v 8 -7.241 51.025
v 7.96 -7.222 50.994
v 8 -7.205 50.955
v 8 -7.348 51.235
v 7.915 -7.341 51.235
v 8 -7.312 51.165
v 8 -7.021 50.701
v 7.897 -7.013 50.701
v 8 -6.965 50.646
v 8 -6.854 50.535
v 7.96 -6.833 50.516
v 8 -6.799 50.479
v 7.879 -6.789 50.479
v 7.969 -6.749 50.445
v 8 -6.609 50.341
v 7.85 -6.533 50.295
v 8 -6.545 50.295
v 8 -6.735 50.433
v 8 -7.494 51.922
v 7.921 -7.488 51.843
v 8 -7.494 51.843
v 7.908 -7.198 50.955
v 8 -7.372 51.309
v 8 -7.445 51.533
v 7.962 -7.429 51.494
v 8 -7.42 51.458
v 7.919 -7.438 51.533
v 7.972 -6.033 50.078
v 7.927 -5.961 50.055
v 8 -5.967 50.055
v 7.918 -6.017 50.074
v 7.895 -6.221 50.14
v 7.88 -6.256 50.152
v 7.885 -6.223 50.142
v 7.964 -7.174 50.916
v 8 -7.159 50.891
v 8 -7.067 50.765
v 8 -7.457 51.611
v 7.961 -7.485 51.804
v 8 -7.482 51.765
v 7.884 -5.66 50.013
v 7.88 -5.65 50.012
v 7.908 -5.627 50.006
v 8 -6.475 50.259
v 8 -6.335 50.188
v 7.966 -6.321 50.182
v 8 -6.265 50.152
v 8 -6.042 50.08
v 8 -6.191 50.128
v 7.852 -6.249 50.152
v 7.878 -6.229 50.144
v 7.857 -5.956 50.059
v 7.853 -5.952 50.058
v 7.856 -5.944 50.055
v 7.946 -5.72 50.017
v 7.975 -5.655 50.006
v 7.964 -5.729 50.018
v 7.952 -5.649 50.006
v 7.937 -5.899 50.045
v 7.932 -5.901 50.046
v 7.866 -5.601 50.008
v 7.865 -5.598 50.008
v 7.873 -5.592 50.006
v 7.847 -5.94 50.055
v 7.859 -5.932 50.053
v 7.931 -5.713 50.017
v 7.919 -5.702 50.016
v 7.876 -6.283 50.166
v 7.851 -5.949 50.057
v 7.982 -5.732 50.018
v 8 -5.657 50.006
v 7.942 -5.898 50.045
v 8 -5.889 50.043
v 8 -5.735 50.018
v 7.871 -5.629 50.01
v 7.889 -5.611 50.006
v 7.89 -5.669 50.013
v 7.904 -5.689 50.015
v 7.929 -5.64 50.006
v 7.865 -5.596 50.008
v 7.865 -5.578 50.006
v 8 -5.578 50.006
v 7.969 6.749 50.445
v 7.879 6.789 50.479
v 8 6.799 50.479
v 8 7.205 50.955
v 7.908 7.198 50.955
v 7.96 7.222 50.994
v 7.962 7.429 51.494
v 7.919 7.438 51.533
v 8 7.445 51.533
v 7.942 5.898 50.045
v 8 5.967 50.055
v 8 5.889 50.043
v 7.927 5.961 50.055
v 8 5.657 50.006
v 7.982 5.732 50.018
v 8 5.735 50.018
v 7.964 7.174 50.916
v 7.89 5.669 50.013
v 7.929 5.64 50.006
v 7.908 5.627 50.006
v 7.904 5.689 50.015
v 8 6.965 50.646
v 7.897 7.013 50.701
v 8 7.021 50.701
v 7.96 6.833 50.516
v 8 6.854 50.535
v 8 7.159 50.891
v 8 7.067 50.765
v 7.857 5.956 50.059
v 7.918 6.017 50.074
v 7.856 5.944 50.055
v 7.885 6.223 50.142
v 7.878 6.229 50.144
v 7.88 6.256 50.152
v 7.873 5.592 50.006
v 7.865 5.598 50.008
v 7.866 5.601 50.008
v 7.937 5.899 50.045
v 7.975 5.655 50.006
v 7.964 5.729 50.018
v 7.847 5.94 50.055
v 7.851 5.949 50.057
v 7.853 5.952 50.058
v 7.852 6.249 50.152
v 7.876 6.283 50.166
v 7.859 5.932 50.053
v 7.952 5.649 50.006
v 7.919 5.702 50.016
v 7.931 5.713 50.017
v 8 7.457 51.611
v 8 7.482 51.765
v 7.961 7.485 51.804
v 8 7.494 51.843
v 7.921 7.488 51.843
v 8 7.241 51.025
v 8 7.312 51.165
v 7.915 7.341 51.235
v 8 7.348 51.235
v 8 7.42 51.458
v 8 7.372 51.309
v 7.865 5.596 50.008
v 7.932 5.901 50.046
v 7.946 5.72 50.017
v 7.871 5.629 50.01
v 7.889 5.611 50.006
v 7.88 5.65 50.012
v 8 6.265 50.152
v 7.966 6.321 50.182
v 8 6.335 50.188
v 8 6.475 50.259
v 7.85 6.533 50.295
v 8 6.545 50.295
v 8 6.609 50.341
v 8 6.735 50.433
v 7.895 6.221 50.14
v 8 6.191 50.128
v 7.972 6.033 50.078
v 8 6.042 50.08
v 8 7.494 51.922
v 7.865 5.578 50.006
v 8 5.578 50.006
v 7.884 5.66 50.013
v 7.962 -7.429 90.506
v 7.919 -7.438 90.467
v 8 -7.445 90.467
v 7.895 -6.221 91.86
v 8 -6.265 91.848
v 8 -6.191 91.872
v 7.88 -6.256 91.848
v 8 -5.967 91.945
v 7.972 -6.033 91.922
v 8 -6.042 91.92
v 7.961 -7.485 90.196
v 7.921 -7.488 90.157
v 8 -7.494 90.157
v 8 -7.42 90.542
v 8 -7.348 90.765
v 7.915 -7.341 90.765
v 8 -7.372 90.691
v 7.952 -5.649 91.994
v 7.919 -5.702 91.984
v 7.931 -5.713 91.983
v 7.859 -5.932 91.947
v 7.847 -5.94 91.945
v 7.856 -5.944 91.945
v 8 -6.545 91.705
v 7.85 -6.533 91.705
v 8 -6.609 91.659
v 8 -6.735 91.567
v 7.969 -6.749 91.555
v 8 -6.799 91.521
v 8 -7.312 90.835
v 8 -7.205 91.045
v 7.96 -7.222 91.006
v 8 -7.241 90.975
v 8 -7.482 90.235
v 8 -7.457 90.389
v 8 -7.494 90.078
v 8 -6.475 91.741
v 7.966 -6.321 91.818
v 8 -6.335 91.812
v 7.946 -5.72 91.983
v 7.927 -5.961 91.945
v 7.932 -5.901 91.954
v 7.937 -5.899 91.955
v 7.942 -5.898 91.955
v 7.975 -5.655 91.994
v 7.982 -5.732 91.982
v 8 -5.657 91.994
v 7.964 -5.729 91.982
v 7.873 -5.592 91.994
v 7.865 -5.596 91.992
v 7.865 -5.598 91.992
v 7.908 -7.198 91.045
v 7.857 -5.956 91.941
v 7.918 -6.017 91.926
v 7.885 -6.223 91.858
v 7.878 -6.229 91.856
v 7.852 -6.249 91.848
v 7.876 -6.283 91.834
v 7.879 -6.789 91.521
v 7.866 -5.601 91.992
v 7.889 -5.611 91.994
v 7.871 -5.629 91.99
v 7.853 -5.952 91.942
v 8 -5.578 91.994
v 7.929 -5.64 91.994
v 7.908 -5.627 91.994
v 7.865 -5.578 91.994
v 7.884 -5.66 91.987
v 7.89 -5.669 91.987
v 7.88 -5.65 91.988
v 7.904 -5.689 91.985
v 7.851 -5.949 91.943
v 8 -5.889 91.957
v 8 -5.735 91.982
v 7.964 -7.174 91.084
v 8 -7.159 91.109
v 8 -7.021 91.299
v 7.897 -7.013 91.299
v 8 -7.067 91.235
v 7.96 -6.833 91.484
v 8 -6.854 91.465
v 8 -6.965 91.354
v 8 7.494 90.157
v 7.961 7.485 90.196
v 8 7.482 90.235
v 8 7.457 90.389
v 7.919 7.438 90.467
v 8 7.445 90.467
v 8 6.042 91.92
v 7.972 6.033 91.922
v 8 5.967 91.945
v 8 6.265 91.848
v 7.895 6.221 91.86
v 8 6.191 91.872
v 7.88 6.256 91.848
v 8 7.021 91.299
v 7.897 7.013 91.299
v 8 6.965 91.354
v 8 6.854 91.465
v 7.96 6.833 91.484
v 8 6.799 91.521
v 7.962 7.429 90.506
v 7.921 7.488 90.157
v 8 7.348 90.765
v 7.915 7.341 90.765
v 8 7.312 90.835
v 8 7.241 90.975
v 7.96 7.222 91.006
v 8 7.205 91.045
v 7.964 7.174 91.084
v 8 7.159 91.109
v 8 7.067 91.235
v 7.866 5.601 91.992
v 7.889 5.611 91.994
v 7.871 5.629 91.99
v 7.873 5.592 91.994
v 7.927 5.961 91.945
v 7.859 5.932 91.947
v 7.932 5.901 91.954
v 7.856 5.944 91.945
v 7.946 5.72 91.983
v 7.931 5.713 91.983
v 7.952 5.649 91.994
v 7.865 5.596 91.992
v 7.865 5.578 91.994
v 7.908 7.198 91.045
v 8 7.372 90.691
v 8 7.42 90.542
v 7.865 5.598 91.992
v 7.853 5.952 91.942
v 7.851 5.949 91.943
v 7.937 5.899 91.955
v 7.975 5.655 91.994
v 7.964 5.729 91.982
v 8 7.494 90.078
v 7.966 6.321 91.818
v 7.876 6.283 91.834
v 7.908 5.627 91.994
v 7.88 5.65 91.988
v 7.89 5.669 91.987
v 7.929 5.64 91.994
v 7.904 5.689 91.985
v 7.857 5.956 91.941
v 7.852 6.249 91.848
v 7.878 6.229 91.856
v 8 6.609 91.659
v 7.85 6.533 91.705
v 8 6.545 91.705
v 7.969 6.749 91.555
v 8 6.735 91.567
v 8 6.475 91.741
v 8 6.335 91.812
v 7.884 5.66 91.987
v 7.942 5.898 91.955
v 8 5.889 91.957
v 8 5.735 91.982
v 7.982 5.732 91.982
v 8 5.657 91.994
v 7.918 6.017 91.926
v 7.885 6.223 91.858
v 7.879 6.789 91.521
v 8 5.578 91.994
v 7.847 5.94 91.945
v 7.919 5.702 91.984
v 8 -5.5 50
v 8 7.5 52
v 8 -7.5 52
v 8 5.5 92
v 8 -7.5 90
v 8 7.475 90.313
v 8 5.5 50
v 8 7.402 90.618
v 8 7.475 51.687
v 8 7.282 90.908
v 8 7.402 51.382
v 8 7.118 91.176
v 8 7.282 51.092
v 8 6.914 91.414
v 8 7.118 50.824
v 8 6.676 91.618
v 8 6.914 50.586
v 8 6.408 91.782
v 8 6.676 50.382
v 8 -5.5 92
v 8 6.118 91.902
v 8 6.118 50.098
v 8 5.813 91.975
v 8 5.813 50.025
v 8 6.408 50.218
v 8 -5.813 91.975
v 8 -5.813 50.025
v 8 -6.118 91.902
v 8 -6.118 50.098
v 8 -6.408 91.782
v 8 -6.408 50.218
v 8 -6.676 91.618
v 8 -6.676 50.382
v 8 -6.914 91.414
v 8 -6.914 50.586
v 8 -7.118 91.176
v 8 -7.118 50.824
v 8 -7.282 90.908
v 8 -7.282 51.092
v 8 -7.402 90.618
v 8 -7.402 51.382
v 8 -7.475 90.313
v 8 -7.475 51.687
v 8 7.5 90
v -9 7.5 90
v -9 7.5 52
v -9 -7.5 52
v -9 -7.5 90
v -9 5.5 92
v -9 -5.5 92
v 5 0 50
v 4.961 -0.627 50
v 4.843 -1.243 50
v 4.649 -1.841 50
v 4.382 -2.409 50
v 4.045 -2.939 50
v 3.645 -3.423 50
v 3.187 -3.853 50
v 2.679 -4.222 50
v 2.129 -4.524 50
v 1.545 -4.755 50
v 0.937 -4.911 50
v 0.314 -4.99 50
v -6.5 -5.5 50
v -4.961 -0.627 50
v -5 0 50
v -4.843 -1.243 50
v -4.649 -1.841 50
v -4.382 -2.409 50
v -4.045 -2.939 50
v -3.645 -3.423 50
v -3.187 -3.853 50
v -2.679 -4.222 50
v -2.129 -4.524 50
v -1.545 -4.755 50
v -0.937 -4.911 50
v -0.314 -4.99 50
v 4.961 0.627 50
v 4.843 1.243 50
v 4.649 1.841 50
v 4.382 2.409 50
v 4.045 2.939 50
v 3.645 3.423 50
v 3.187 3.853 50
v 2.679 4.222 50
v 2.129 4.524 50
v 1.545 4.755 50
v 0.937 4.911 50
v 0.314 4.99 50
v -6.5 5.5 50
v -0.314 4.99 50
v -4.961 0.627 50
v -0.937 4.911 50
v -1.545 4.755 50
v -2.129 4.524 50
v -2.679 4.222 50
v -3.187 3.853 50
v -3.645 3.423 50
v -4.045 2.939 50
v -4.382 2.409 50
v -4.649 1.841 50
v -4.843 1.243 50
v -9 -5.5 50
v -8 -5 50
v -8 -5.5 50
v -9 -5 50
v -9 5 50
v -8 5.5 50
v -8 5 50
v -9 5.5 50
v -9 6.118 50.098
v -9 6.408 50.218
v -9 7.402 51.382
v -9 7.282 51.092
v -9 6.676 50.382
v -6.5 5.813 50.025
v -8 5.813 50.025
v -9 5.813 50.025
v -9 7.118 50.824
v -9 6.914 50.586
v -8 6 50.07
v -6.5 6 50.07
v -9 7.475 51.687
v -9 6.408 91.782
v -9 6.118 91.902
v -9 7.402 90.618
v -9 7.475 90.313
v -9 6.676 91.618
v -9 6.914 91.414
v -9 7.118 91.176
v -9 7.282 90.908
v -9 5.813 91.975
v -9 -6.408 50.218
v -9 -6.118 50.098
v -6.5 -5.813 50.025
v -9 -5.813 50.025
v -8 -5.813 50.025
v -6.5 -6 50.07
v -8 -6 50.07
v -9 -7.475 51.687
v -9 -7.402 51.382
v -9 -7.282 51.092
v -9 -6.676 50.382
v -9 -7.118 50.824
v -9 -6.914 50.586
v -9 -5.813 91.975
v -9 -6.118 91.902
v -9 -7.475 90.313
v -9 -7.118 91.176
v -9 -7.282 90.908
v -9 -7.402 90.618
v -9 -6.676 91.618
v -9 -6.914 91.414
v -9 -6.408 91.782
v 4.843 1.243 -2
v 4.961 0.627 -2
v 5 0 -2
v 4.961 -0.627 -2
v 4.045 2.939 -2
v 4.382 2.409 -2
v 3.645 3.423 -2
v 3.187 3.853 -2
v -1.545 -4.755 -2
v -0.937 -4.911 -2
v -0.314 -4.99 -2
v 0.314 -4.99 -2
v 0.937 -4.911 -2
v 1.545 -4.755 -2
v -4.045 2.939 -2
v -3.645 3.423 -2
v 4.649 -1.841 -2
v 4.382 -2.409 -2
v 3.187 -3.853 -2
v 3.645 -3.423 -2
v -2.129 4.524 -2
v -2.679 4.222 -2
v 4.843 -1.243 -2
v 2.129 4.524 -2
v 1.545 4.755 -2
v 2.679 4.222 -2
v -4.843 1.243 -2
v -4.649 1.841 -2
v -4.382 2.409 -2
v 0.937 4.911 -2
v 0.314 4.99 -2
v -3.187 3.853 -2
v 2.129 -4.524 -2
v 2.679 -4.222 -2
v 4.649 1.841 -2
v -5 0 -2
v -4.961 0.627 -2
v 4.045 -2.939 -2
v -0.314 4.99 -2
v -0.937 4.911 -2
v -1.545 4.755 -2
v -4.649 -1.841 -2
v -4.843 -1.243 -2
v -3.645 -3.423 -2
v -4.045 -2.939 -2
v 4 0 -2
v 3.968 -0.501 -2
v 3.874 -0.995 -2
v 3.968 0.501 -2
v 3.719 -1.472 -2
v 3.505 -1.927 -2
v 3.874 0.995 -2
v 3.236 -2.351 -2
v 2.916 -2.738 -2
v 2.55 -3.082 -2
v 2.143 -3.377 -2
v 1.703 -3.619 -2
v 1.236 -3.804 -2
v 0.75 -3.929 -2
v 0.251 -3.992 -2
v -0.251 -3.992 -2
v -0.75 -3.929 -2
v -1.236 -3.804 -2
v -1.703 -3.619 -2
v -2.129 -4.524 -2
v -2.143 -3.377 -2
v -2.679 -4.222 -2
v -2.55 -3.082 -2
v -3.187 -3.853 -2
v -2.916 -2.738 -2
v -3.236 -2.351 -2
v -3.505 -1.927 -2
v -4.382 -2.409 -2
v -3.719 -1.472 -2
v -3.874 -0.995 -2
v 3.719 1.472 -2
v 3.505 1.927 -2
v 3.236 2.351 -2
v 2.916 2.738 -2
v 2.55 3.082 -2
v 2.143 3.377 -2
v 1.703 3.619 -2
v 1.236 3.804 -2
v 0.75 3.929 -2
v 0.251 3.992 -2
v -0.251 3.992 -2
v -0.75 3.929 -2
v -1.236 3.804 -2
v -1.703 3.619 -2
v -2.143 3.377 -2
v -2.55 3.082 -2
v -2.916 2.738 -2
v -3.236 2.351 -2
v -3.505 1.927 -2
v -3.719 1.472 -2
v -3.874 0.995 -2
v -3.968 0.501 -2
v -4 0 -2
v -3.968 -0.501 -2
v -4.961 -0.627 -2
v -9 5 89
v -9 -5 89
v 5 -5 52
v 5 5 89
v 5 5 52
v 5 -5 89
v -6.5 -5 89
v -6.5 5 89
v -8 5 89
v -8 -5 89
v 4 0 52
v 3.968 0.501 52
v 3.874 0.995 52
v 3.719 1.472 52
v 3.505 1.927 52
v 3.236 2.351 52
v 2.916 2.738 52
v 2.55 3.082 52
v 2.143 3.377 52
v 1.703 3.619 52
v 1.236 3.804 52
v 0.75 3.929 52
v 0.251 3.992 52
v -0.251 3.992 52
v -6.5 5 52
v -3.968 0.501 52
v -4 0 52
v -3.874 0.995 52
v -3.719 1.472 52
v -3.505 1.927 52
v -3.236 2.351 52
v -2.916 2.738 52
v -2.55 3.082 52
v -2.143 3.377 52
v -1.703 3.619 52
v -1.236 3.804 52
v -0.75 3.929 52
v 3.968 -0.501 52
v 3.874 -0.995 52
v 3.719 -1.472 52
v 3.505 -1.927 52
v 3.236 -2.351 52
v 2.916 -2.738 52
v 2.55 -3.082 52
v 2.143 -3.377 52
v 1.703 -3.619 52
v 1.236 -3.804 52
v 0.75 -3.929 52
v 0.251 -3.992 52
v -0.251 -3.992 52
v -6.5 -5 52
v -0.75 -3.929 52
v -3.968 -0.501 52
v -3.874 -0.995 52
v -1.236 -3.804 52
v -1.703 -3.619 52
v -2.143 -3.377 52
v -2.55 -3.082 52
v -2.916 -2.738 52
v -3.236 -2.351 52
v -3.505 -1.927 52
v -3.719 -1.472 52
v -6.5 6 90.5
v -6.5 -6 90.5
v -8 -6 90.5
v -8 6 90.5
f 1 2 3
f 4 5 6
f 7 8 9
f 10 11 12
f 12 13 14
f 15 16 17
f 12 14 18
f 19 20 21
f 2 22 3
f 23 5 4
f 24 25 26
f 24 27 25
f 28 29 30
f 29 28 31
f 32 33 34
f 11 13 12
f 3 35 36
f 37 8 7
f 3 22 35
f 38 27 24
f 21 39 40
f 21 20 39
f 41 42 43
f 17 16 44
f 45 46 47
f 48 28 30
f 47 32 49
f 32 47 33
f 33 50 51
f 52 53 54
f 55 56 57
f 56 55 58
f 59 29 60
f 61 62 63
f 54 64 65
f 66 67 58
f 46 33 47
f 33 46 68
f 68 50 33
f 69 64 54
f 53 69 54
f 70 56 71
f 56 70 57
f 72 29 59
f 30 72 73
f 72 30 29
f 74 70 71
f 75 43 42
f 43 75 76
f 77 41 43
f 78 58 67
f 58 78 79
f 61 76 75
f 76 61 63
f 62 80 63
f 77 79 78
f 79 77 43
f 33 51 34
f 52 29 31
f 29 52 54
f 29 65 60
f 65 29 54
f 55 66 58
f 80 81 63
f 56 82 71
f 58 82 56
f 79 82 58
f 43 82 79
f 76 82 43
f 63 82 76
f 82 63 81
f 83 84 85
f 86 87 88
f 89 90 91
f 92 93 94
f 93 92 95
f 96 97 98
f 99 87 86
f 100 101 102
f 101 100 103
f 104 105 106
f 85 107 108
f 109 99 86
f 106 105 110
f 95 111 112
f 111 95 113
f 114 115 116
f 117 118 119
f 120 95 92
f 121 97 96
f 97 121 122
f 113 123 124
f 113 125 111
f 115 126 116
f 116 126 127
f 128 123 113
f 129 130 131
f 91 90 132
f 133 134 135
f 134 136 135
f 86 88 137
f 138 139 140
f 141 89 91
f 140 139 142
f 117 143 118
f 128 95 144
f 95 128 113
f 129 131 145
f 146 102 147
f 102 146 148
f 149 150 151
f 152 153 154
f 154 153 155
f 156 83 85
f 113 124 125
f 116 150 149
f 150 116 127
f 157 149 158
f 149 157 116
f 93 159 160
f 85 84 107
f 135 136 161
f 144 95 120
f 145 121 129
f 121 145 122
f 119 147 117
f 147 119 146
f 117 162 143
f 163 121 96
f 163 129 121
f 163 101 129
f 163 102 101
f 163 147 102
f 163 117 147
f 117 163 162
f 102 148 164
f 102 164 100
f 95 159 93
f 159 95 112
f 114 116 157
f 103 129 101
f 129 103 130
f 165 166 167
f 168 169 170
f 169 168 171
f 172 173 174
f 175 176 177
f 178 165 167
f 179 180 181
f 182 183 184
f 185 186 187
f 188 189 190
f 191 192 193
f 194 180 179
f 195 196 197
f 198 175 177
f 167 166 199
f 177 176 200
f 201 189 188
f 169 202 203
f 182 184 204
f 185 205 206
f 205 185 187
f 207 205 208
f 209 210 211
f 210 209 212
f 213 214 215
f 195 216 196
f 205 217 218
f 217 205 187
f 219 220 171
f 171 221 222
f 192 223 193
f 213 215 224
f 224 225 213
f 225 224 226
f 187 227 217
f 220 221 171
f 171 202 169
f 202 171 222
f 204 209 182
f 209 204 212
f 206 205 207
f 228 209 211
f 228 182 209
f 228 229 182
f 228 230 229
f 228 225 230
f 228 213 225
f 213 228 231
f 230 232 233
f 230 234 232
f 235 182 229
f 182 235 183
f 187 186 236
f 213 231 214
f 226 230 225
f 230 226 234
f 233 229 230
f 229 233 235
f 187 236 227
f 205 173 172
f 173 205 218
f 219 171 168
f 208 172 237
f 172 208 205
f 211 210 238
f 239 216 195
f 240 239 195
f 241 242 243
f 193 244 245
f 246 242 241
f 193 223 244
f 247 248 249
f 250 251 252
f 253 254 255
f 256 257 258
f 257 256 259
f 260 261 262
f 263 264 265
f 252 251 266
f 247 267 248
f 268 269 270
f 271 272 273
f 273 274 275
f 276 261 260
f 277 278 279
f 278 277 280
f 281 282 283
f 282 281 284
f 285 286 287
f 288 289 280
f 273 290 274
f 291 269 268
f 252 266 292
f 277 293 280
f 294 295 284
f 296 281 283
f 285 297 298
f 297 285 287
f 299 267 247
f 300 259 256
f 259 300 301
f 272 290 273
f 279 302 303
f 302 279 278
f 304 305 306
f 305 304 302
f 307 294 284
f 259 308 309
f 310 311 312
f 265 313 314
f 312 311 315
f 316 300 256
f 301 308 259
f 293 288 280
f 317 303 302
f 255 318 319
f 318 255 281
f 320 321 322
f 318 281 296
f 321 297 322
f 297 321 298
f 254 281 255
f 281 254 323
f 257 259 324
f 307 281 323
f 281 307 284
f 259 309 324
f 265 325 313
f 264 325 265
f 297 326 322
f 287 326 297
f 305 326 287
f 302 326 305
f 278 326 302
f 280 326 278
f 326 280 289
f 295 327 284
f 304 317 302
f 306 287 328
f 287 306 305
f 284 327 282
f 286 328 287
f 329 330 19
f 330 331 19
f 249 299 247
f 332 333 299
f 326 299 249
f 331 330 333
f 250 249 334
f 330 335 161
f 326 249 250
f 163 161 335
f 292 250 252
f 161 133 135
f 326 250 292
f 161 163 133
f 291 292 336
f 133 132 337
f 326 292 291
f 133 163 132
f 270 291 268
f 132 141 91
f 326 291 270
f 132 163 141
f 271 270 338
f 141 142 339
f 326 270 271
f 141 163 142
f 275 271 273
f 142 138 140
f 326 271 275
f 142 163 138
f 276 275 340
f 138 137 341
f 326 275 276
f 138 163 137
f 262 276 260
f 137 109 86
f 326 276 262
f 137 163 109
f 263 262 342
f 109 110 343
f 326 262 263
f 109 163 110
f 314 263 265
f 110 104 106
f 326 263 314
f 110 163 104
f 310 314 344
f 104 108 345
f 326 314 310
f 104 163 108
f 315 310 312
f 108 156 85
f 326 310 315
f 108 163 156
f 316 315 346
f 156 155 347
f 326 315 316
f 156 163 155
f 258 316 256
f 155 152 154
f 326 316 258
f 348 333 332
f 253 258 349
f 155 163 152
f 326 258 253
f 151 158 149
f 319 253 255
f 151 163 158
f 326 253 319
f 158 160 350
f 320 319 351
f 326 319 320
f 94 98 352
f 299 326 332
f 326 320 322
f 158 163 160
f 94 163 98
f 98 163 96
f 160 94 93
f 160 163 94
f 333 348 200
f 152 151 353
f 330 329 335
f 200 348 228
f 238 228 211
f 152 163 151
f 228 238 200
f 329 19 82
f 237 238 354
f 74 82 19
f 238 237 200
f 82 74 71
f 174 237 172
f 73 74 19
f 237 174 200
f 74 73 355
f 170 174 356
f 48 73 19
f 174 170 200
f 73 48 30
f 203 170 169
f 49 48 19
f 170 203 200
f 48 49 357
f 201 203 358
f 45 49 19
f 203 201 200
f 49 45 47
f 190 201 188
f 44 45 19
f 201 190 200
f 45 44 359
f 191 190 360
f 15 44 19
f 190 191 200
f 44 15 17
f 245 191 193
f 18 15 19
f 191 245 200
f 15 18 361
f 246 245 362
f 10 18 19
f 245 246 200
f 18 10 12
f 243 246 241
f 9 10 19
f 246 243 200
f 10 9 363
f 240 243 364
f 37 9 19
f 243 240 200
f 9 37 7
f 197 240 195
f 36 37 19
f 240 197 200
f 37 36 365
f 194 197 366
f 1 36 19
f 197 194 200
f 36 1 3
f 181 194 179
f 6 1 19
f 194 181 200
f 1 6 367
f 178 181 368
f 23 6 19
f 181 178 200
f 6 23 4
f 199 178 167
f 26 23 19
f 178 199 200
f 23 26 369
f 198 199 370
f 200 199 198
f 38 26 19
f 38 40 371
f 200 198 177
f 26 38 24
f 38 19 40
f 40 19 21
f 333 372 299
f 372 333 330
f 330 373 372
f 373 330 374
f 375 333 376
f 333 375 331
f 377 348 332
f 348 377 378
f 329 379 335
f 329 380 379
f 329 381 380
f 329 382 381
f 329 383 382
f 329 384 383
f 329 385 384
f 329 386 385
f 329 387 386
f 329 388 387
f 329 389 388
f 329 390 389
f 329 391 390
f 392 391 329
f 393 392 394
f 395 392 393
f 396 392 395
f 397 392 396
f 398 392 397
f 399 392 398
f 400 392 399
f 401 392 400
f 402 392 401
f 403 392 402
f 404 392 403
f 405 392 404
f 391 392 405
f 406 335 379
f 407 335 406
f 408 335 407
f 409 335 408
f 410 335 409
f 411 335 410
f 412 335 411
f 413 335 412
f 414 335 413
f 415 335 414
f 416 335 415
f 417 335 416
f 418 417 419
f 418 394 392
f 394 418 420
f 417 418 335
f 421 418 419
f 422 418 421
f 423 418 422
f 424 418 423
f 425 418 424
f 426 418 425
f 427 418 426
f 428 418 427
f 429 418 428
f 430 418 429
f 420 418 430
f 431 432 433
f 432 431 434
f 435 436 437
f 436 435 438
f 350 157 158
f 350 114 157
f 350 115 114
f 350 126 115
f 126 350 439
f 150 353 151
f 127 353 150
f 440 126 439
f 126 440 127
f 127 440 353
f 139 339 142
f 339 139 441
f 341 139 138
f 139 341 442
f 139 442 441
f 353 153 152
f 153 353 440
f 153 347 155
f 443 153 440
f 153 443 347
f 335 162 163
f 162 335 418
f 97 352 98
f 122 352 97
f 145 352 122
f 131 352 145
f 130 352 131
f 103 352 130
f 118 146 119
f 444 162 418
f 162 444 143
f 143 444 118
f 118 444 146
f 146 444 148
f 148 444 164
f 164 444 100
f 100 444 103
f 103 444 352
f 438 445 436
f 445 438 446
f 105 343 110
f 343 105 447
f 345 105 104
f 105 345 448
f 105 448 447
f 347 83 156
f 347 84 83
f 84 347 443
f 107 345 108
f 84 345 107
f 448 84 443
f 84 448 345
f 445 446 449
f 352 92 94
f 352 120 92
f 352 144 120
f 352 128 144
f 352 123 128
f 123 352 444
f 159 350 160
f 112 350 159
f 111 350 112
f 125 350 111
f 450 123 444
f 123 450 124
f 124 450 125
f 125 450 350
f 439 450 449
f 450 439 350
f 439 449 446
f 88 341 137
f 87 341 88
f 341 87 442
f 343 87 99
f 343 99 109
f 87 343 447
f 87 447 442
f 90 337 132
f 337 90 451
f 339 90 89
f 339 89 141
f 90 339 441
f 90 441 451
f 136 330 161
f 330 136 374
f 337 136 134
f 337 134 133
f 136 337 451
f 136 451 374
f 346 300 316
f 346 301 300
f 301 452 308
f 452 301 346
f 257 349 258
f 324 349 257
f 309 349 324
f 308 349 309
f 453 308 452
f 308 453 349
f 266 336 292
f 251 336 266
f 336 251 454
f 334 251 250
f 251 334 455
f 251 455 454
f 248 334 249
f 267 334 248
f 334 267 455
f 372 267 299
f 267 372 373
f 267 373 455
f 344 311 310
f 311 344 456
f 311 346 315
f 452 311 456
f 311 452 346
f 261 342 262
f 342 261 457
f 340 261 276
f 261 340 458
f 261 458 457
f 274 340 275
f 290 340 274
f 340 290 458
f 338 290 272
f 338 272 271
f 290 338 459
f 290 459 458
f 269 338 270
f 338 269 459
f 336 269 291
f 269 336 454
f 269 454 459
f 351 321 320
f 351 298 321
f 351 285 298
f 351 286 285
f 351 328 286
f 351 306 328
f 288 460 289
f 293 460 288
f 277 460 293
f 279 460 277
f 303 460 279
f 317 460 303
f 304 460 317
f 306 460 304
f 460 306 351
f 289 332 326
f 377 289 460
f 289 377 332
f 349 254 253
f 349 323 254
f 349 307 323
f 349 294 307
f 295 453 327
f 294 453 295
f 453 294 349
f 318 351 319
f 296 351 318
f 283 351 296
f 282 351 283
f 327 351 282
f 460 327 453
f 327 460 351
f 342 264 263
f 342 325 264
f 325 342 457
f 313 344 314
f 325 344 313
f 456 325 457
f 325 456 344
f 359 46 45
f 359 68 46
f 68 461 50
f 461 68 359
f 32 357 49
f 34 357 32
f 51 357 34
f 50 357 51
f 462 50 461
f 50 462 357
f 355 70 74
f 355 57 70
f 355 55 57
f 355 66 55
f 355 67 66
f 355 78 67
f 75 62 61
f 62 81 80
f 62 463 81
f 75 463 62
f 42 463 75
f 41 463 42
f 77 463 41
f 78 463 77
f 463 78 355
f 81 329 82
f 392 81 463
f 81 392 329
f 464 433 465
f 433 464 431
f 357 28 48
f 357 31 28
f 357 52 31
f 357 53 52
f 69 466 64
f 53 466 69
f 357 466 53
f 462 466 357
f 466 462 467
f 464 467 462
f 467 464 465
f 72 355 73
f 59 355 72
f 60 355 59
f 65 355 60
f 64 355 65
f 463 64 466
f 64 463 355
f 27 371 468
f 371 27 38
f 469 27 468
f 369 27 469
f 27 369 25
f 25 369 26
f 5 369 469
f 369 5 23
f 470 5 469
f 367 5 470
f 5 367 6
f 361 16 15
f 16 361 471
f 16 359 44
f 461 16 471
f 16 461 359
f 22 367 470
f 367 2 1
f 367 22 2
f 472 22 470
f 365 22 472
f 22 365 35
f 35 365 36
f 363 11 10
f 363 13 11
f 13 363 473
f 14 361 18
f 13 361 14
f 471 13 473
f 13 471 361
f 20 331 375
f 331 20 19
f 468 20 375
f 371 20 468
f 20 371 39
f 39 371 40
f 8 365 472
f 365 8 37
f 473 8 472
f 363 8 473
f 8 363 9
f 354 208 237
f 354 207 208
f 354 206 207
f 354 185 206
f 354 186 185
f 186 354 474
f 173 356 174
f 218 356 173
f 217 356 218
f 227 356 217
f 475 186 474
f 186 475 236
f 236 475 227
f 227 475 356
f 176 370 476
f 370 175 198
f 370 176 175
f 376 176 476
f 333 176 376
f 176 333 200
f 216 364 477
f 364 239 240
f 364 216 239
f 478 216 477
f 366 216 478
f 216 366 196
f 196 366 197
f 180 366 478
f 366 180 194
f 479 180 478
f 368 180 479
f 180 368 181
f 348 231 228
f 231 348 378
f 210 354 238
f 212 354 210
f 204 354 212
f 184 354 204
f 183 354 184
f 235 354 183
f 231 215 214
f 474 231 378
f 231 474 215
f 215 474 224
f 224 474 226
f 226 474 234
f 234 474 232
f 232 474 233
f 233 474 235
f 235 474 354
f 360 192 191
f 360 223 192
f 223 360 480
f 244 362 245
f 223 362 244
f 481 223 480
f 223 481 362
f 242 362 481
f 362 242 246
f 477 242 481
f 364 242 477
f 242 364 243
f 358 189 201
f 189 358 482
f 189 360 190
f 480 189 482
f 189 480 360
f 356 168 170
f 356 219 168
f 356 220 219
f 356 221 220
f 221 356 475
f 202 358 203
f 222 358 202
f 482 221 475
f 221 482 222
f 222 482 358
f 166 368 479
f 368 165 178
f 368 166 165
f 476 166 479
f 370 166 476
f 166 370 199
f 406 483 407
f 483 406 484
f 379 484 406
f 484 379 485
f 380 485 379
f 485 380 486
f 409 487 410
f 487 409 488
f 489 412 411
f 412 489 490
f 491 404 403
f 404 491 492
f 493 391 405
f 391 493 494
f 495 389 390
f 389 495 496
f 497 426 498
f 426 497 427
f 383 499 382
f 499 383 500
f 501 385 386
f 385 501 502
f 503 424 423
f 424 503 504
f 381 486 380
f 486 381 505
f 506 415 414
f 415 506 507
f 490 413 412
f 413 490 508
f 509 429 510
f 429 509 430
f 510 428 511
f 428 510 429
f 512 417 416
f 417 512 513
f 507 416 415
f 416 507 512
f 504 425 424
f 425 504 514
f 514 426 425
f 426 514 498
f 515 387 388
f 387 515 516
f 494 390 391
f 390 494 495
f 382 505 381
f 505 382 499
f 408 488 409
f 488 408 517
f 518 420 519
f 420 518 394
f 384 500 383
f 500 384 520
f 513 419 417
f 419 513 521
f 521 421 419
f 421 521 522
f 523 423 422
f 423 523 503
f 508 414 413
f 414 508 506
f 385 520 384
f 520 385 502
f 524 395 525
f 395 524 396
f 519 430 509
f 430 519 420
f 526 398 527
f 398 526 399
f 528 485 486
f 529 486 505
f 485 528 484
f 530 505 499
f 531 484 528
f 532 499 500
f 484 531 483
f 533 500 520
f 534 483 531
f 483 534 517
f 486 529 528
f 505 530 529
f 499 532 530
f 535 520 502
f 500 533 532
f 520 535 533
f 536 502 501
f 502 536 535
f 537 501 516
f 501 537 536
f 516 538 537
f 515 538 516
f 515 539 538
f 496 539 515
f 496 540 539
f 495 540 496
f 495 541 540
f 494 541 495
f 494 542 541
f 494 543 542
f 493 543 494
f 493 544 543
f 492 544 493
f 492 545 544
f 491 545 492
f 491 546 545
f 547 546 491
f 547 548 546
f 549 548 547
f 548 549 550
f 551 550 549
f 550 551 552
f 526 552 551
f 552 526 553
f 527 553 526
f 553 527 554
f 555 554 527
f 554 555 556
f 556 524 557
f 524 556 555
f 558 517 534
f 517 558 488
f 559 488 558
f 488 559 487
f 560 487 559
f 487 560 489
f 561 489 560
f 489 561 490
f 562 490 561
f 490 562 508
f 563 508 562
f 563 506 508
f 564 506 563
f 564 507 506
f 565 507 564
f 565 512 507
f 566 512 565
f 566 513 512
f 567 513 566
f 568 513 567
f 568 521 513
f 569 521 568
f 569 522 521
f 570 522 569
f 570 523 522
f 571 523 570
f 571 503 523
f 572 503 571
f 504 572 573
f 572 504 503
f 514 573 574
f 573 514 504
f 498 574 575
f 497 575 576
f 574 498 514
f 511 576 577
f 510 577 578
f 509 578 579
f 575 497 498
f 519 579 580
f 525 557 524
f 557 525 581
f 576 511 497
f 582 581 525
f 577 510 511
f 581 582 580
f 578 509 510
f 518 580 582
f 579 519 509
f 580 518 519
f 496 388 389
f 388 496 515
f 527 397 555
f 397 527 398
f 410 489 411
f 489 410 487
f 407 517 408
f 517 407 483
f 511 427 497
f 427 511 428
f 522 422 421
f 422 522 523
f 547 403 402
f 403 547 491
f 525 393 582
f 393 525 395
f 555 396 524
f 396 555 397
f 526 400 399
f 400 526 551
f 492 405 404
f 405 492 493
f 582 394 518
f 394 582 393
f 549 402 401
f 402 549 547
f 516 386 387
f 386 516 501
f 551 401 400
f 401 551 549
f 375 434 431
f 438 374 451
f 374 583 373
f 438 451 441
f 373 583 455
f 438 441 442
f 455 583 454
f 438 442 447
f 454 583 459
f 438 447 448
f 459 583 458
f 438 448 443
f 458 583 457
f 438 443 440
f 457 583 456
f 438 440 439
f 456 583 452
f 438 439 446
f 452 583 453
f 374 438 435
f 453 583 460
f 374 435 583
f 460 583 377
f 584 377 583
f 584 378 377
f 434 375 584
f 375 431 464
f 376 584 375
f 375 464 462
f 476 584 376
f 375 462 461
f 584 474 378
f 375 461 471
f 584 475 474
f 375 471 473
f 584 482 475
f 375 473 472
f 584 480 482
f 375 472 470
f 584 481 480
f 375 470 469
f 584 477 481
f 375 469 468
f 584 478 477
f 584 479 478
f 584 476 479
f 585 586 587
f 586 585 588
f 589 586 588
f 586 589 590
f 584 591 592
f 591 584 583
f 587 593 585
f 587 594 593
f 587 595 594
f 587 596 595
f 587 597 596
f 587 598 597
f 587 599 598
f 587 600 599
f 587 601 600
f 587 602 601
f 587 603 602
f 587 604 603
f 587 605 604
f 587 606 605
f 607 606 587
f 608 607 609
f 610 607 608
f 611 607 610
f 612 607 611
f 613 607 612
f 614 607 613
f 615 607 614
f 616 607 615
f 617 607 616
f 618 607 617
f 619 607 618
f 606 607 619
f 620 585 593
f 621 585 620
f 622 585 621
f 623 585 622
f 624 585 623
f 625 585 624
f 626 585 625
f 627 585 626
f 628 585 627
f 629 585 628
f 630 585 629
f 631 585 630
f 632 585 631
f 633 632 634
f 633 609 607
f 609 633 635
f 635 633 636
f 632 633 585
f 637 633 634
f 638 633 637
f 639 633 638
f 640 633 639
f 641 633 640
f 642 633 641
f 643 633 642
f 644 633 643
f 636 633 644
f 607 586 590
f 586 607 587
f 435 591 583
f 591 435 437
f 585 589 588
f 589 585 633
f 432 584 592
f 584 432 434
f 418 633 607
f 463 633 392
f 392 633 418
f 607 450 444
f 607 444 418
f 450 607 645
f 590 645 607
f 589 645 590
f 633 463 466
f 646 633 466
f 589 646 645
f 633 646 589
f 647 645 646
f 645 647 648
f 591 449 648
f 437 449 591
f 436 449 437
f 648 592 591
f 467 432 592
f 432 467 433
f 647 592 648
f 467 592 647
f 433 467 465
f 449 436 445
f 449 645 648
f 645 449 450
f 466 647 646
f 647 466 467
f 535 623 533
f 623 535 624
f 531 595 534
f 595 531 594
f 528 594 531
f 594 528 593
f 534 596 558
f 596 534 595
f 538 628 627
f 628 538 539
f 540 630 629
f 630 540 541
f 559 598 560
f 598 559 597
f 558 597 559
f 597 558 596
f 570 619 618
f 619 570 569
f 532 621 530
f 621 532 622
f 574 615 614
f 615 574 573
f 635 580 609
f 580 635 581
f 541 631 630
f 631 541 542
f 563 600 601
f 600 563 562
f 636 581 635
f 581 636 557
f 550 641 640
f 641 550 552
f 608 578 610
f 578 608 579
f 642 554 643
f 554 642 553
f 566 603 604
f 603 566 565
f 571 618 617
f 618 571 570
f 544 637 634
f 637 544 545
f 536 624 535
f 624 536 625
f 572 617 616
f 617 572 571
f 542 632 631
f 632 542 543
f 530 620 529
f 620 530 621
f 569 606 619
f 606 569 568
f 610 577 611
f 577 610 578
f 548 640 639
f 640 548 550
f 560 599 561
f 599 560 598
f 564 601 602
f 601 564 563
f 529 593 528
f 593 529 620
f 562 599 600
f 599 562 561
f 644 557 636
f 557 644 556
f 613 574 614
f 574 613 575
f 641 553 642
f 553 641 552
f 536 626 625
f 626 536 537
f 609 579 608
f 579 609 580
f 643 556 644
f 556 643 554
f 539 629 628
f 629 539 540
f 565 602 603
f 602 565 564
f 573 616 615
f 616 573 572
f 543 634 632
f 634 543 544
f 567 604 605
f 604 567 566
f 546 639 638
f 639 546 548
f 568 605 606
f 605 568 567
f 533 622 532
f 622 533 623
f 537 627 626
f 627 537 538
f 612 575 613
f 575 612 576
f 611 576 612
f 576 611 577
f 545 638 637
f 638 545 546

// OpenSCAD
// file: cubo.scad
//2014 - Air Soluções Inteligentes
//Desenvolvido por Alexandre Rossini

vertices=40;
//cubo(16.5,5.0,50,1.0);

module cubo(largura,altura,profundidade,borda)
{
	difference()
	{
		difference()
		{
			union()
			{
				translate([borda,0,borda]) cube([profundidade-borda*2.0,largura,altura-borda*2.0]);
				translate([0,borda,borda]) cube([profundidade,largura-borda*2.0,altura-borda*2.0]);
				translate([borda,borda,0]) cube([profundidade-borda*2.0,largura-borda*2.0,altura]);

				borda(largura,altura,profundidade,borda);
				translate([profundidade-borda*2.0,0,0]) borda(largura,altura,profundidade,borda);

				rotate([0,90,0]) translate([-borda,largura-borda,borda]) cylinder(profundidade-borda*2.0,borda,borda,$fn=vertices);
				rotate([0,90,0]) translate([-altura+borda,largura-borda,borda]) cylinder(profundidade-borda*2.0,borda,borda,$fn=vertices);
				rotate([0,90,0]) translate([-borda,borda,borda]) cylinder(profundidade-borda*2.0,borda,borda,$fn=vertices);
				rotate([0,90,0]) translate([-altura+borda,borda,borda]) cylinder(profundidade-borda*2.0,borda,borda,$fn=vertices);
			}
		}
	}
}

module borda(largura,altura,profundidade,borda)
{
	union()
	{
		//bottom right
		translate([borda,borda,borda]) sphere(borda,$fn=vertices);
		//bottom left
		translate([borda,largura-borda,borda]) sphere(borda,$fn=vertices);
		//up right
		translate([borda,borda,altura-borda]) sphere(borda,$fn=vertices);
		//up left
		translate([borda,largura-borda,altura-borda]) sphere(borda,$fn=vertices);

		//left
		translate([borda,borda,borda]) cylinder(altura-borda*2.0,borda,borda,$fn=vertices);
		//right
		translate([borda,largura-borda,borda]) cylinder(altura-borda*2.0,borda,borda,$fn=vertices);
		//bottom
		rotate([90,0,0]) translate([borda,borda,-largura+borda]) cylinder(largura-borda*2.0,borda,borda,$fn=vertices);
		//up
		rotate([90,0,0]) translate([borda,altura-borda,-largura+borda]) cylinder(largura-borda*2.0,borda,borda,$fn=vertices);

	}
}
// main file
//rotate([180,0,0]) translate([-12.7,-12.7,-53.4]) import("Streetlight_post.STL");
//translate([-5,-7.5,50]) rotate([90,0,90]) import("Streetlight_back.STL");
//import("Streetlight_Top.STL");
include<cubo.scad>;

/*difference()
{
	color("red") translate([0,0,-2]) cylinder(54,5.0,5.0, $fn=50);
	color("red") translate([0,0,-1]) cylinder(56,4.0,4.0, $fn=50);
}*/

difference()
{
	difference()
	{
		union()
		{
			color("red") translate([0,0,-2]) cylinder(54,5.0,5.0, $fn=50);
			//color("blue") translate([-5,-7.5,50]) cubo(15,30,12,2);
			color("blue") translate([-12,-7.5,50]) cubo(15,42,22,2);
		}
		union()
		{
			color("green") translate([8,-8.5,50]) cube([6,17,45]);
//			color("green") translate([-12,-8.5,49]) cube([6,17,32]);
			color("green") translate([-15,-8.5,49]) cube([6,17,45]);
		}
	}
	union()
	{
		translate([-10,-5.0,52]) cube([15,10,37]);
  		translate([-8,-6.0,49.5]) cube([1.5,12,41]);
		translate([-9.2,-5.0,49]) cube([1.5,10,26]);
		color("red") translate([0,0,-3]) cylinder(56,4.0,4.0, $fn=50);
	//	color("red") translate([0,0,0]) cylinder(54,5.0,5.0, $fn=50);
	}
}

/*translate([-5,7.5,73]) rotate([180,90,0]) led();
translate([-5,7.5,83]) rotate([180,90,0]) led();
translate([-5,7.5,93]) rotate([180,90,0]) led();*/

//translate([-7.4,-5,131]) rotate([90,90,90]) parafusoCase();

module led()
{
	difference()
	{
		difference()
		{
			color("blue") translate([10,7.5,0]) cylinder(8,4.2,4.2, $fn=50);
			color("blue") translate([10,7.5,2]) cylinder(10,3.5,3.5, $fn=50);
		}
		color("green") translate([8,2.5,10]) rotate([0,45,0]) cube([10,10,10]);
	}
}

module parafusoCase()
{
		difference()
		{
			translate([75,5,1]) cylinder(11.4,3.0,3.0, $fn=50);

			translate([75,5,-1]) cylinder(12.4,1.3,1.3, $fn=50);
		}
}
